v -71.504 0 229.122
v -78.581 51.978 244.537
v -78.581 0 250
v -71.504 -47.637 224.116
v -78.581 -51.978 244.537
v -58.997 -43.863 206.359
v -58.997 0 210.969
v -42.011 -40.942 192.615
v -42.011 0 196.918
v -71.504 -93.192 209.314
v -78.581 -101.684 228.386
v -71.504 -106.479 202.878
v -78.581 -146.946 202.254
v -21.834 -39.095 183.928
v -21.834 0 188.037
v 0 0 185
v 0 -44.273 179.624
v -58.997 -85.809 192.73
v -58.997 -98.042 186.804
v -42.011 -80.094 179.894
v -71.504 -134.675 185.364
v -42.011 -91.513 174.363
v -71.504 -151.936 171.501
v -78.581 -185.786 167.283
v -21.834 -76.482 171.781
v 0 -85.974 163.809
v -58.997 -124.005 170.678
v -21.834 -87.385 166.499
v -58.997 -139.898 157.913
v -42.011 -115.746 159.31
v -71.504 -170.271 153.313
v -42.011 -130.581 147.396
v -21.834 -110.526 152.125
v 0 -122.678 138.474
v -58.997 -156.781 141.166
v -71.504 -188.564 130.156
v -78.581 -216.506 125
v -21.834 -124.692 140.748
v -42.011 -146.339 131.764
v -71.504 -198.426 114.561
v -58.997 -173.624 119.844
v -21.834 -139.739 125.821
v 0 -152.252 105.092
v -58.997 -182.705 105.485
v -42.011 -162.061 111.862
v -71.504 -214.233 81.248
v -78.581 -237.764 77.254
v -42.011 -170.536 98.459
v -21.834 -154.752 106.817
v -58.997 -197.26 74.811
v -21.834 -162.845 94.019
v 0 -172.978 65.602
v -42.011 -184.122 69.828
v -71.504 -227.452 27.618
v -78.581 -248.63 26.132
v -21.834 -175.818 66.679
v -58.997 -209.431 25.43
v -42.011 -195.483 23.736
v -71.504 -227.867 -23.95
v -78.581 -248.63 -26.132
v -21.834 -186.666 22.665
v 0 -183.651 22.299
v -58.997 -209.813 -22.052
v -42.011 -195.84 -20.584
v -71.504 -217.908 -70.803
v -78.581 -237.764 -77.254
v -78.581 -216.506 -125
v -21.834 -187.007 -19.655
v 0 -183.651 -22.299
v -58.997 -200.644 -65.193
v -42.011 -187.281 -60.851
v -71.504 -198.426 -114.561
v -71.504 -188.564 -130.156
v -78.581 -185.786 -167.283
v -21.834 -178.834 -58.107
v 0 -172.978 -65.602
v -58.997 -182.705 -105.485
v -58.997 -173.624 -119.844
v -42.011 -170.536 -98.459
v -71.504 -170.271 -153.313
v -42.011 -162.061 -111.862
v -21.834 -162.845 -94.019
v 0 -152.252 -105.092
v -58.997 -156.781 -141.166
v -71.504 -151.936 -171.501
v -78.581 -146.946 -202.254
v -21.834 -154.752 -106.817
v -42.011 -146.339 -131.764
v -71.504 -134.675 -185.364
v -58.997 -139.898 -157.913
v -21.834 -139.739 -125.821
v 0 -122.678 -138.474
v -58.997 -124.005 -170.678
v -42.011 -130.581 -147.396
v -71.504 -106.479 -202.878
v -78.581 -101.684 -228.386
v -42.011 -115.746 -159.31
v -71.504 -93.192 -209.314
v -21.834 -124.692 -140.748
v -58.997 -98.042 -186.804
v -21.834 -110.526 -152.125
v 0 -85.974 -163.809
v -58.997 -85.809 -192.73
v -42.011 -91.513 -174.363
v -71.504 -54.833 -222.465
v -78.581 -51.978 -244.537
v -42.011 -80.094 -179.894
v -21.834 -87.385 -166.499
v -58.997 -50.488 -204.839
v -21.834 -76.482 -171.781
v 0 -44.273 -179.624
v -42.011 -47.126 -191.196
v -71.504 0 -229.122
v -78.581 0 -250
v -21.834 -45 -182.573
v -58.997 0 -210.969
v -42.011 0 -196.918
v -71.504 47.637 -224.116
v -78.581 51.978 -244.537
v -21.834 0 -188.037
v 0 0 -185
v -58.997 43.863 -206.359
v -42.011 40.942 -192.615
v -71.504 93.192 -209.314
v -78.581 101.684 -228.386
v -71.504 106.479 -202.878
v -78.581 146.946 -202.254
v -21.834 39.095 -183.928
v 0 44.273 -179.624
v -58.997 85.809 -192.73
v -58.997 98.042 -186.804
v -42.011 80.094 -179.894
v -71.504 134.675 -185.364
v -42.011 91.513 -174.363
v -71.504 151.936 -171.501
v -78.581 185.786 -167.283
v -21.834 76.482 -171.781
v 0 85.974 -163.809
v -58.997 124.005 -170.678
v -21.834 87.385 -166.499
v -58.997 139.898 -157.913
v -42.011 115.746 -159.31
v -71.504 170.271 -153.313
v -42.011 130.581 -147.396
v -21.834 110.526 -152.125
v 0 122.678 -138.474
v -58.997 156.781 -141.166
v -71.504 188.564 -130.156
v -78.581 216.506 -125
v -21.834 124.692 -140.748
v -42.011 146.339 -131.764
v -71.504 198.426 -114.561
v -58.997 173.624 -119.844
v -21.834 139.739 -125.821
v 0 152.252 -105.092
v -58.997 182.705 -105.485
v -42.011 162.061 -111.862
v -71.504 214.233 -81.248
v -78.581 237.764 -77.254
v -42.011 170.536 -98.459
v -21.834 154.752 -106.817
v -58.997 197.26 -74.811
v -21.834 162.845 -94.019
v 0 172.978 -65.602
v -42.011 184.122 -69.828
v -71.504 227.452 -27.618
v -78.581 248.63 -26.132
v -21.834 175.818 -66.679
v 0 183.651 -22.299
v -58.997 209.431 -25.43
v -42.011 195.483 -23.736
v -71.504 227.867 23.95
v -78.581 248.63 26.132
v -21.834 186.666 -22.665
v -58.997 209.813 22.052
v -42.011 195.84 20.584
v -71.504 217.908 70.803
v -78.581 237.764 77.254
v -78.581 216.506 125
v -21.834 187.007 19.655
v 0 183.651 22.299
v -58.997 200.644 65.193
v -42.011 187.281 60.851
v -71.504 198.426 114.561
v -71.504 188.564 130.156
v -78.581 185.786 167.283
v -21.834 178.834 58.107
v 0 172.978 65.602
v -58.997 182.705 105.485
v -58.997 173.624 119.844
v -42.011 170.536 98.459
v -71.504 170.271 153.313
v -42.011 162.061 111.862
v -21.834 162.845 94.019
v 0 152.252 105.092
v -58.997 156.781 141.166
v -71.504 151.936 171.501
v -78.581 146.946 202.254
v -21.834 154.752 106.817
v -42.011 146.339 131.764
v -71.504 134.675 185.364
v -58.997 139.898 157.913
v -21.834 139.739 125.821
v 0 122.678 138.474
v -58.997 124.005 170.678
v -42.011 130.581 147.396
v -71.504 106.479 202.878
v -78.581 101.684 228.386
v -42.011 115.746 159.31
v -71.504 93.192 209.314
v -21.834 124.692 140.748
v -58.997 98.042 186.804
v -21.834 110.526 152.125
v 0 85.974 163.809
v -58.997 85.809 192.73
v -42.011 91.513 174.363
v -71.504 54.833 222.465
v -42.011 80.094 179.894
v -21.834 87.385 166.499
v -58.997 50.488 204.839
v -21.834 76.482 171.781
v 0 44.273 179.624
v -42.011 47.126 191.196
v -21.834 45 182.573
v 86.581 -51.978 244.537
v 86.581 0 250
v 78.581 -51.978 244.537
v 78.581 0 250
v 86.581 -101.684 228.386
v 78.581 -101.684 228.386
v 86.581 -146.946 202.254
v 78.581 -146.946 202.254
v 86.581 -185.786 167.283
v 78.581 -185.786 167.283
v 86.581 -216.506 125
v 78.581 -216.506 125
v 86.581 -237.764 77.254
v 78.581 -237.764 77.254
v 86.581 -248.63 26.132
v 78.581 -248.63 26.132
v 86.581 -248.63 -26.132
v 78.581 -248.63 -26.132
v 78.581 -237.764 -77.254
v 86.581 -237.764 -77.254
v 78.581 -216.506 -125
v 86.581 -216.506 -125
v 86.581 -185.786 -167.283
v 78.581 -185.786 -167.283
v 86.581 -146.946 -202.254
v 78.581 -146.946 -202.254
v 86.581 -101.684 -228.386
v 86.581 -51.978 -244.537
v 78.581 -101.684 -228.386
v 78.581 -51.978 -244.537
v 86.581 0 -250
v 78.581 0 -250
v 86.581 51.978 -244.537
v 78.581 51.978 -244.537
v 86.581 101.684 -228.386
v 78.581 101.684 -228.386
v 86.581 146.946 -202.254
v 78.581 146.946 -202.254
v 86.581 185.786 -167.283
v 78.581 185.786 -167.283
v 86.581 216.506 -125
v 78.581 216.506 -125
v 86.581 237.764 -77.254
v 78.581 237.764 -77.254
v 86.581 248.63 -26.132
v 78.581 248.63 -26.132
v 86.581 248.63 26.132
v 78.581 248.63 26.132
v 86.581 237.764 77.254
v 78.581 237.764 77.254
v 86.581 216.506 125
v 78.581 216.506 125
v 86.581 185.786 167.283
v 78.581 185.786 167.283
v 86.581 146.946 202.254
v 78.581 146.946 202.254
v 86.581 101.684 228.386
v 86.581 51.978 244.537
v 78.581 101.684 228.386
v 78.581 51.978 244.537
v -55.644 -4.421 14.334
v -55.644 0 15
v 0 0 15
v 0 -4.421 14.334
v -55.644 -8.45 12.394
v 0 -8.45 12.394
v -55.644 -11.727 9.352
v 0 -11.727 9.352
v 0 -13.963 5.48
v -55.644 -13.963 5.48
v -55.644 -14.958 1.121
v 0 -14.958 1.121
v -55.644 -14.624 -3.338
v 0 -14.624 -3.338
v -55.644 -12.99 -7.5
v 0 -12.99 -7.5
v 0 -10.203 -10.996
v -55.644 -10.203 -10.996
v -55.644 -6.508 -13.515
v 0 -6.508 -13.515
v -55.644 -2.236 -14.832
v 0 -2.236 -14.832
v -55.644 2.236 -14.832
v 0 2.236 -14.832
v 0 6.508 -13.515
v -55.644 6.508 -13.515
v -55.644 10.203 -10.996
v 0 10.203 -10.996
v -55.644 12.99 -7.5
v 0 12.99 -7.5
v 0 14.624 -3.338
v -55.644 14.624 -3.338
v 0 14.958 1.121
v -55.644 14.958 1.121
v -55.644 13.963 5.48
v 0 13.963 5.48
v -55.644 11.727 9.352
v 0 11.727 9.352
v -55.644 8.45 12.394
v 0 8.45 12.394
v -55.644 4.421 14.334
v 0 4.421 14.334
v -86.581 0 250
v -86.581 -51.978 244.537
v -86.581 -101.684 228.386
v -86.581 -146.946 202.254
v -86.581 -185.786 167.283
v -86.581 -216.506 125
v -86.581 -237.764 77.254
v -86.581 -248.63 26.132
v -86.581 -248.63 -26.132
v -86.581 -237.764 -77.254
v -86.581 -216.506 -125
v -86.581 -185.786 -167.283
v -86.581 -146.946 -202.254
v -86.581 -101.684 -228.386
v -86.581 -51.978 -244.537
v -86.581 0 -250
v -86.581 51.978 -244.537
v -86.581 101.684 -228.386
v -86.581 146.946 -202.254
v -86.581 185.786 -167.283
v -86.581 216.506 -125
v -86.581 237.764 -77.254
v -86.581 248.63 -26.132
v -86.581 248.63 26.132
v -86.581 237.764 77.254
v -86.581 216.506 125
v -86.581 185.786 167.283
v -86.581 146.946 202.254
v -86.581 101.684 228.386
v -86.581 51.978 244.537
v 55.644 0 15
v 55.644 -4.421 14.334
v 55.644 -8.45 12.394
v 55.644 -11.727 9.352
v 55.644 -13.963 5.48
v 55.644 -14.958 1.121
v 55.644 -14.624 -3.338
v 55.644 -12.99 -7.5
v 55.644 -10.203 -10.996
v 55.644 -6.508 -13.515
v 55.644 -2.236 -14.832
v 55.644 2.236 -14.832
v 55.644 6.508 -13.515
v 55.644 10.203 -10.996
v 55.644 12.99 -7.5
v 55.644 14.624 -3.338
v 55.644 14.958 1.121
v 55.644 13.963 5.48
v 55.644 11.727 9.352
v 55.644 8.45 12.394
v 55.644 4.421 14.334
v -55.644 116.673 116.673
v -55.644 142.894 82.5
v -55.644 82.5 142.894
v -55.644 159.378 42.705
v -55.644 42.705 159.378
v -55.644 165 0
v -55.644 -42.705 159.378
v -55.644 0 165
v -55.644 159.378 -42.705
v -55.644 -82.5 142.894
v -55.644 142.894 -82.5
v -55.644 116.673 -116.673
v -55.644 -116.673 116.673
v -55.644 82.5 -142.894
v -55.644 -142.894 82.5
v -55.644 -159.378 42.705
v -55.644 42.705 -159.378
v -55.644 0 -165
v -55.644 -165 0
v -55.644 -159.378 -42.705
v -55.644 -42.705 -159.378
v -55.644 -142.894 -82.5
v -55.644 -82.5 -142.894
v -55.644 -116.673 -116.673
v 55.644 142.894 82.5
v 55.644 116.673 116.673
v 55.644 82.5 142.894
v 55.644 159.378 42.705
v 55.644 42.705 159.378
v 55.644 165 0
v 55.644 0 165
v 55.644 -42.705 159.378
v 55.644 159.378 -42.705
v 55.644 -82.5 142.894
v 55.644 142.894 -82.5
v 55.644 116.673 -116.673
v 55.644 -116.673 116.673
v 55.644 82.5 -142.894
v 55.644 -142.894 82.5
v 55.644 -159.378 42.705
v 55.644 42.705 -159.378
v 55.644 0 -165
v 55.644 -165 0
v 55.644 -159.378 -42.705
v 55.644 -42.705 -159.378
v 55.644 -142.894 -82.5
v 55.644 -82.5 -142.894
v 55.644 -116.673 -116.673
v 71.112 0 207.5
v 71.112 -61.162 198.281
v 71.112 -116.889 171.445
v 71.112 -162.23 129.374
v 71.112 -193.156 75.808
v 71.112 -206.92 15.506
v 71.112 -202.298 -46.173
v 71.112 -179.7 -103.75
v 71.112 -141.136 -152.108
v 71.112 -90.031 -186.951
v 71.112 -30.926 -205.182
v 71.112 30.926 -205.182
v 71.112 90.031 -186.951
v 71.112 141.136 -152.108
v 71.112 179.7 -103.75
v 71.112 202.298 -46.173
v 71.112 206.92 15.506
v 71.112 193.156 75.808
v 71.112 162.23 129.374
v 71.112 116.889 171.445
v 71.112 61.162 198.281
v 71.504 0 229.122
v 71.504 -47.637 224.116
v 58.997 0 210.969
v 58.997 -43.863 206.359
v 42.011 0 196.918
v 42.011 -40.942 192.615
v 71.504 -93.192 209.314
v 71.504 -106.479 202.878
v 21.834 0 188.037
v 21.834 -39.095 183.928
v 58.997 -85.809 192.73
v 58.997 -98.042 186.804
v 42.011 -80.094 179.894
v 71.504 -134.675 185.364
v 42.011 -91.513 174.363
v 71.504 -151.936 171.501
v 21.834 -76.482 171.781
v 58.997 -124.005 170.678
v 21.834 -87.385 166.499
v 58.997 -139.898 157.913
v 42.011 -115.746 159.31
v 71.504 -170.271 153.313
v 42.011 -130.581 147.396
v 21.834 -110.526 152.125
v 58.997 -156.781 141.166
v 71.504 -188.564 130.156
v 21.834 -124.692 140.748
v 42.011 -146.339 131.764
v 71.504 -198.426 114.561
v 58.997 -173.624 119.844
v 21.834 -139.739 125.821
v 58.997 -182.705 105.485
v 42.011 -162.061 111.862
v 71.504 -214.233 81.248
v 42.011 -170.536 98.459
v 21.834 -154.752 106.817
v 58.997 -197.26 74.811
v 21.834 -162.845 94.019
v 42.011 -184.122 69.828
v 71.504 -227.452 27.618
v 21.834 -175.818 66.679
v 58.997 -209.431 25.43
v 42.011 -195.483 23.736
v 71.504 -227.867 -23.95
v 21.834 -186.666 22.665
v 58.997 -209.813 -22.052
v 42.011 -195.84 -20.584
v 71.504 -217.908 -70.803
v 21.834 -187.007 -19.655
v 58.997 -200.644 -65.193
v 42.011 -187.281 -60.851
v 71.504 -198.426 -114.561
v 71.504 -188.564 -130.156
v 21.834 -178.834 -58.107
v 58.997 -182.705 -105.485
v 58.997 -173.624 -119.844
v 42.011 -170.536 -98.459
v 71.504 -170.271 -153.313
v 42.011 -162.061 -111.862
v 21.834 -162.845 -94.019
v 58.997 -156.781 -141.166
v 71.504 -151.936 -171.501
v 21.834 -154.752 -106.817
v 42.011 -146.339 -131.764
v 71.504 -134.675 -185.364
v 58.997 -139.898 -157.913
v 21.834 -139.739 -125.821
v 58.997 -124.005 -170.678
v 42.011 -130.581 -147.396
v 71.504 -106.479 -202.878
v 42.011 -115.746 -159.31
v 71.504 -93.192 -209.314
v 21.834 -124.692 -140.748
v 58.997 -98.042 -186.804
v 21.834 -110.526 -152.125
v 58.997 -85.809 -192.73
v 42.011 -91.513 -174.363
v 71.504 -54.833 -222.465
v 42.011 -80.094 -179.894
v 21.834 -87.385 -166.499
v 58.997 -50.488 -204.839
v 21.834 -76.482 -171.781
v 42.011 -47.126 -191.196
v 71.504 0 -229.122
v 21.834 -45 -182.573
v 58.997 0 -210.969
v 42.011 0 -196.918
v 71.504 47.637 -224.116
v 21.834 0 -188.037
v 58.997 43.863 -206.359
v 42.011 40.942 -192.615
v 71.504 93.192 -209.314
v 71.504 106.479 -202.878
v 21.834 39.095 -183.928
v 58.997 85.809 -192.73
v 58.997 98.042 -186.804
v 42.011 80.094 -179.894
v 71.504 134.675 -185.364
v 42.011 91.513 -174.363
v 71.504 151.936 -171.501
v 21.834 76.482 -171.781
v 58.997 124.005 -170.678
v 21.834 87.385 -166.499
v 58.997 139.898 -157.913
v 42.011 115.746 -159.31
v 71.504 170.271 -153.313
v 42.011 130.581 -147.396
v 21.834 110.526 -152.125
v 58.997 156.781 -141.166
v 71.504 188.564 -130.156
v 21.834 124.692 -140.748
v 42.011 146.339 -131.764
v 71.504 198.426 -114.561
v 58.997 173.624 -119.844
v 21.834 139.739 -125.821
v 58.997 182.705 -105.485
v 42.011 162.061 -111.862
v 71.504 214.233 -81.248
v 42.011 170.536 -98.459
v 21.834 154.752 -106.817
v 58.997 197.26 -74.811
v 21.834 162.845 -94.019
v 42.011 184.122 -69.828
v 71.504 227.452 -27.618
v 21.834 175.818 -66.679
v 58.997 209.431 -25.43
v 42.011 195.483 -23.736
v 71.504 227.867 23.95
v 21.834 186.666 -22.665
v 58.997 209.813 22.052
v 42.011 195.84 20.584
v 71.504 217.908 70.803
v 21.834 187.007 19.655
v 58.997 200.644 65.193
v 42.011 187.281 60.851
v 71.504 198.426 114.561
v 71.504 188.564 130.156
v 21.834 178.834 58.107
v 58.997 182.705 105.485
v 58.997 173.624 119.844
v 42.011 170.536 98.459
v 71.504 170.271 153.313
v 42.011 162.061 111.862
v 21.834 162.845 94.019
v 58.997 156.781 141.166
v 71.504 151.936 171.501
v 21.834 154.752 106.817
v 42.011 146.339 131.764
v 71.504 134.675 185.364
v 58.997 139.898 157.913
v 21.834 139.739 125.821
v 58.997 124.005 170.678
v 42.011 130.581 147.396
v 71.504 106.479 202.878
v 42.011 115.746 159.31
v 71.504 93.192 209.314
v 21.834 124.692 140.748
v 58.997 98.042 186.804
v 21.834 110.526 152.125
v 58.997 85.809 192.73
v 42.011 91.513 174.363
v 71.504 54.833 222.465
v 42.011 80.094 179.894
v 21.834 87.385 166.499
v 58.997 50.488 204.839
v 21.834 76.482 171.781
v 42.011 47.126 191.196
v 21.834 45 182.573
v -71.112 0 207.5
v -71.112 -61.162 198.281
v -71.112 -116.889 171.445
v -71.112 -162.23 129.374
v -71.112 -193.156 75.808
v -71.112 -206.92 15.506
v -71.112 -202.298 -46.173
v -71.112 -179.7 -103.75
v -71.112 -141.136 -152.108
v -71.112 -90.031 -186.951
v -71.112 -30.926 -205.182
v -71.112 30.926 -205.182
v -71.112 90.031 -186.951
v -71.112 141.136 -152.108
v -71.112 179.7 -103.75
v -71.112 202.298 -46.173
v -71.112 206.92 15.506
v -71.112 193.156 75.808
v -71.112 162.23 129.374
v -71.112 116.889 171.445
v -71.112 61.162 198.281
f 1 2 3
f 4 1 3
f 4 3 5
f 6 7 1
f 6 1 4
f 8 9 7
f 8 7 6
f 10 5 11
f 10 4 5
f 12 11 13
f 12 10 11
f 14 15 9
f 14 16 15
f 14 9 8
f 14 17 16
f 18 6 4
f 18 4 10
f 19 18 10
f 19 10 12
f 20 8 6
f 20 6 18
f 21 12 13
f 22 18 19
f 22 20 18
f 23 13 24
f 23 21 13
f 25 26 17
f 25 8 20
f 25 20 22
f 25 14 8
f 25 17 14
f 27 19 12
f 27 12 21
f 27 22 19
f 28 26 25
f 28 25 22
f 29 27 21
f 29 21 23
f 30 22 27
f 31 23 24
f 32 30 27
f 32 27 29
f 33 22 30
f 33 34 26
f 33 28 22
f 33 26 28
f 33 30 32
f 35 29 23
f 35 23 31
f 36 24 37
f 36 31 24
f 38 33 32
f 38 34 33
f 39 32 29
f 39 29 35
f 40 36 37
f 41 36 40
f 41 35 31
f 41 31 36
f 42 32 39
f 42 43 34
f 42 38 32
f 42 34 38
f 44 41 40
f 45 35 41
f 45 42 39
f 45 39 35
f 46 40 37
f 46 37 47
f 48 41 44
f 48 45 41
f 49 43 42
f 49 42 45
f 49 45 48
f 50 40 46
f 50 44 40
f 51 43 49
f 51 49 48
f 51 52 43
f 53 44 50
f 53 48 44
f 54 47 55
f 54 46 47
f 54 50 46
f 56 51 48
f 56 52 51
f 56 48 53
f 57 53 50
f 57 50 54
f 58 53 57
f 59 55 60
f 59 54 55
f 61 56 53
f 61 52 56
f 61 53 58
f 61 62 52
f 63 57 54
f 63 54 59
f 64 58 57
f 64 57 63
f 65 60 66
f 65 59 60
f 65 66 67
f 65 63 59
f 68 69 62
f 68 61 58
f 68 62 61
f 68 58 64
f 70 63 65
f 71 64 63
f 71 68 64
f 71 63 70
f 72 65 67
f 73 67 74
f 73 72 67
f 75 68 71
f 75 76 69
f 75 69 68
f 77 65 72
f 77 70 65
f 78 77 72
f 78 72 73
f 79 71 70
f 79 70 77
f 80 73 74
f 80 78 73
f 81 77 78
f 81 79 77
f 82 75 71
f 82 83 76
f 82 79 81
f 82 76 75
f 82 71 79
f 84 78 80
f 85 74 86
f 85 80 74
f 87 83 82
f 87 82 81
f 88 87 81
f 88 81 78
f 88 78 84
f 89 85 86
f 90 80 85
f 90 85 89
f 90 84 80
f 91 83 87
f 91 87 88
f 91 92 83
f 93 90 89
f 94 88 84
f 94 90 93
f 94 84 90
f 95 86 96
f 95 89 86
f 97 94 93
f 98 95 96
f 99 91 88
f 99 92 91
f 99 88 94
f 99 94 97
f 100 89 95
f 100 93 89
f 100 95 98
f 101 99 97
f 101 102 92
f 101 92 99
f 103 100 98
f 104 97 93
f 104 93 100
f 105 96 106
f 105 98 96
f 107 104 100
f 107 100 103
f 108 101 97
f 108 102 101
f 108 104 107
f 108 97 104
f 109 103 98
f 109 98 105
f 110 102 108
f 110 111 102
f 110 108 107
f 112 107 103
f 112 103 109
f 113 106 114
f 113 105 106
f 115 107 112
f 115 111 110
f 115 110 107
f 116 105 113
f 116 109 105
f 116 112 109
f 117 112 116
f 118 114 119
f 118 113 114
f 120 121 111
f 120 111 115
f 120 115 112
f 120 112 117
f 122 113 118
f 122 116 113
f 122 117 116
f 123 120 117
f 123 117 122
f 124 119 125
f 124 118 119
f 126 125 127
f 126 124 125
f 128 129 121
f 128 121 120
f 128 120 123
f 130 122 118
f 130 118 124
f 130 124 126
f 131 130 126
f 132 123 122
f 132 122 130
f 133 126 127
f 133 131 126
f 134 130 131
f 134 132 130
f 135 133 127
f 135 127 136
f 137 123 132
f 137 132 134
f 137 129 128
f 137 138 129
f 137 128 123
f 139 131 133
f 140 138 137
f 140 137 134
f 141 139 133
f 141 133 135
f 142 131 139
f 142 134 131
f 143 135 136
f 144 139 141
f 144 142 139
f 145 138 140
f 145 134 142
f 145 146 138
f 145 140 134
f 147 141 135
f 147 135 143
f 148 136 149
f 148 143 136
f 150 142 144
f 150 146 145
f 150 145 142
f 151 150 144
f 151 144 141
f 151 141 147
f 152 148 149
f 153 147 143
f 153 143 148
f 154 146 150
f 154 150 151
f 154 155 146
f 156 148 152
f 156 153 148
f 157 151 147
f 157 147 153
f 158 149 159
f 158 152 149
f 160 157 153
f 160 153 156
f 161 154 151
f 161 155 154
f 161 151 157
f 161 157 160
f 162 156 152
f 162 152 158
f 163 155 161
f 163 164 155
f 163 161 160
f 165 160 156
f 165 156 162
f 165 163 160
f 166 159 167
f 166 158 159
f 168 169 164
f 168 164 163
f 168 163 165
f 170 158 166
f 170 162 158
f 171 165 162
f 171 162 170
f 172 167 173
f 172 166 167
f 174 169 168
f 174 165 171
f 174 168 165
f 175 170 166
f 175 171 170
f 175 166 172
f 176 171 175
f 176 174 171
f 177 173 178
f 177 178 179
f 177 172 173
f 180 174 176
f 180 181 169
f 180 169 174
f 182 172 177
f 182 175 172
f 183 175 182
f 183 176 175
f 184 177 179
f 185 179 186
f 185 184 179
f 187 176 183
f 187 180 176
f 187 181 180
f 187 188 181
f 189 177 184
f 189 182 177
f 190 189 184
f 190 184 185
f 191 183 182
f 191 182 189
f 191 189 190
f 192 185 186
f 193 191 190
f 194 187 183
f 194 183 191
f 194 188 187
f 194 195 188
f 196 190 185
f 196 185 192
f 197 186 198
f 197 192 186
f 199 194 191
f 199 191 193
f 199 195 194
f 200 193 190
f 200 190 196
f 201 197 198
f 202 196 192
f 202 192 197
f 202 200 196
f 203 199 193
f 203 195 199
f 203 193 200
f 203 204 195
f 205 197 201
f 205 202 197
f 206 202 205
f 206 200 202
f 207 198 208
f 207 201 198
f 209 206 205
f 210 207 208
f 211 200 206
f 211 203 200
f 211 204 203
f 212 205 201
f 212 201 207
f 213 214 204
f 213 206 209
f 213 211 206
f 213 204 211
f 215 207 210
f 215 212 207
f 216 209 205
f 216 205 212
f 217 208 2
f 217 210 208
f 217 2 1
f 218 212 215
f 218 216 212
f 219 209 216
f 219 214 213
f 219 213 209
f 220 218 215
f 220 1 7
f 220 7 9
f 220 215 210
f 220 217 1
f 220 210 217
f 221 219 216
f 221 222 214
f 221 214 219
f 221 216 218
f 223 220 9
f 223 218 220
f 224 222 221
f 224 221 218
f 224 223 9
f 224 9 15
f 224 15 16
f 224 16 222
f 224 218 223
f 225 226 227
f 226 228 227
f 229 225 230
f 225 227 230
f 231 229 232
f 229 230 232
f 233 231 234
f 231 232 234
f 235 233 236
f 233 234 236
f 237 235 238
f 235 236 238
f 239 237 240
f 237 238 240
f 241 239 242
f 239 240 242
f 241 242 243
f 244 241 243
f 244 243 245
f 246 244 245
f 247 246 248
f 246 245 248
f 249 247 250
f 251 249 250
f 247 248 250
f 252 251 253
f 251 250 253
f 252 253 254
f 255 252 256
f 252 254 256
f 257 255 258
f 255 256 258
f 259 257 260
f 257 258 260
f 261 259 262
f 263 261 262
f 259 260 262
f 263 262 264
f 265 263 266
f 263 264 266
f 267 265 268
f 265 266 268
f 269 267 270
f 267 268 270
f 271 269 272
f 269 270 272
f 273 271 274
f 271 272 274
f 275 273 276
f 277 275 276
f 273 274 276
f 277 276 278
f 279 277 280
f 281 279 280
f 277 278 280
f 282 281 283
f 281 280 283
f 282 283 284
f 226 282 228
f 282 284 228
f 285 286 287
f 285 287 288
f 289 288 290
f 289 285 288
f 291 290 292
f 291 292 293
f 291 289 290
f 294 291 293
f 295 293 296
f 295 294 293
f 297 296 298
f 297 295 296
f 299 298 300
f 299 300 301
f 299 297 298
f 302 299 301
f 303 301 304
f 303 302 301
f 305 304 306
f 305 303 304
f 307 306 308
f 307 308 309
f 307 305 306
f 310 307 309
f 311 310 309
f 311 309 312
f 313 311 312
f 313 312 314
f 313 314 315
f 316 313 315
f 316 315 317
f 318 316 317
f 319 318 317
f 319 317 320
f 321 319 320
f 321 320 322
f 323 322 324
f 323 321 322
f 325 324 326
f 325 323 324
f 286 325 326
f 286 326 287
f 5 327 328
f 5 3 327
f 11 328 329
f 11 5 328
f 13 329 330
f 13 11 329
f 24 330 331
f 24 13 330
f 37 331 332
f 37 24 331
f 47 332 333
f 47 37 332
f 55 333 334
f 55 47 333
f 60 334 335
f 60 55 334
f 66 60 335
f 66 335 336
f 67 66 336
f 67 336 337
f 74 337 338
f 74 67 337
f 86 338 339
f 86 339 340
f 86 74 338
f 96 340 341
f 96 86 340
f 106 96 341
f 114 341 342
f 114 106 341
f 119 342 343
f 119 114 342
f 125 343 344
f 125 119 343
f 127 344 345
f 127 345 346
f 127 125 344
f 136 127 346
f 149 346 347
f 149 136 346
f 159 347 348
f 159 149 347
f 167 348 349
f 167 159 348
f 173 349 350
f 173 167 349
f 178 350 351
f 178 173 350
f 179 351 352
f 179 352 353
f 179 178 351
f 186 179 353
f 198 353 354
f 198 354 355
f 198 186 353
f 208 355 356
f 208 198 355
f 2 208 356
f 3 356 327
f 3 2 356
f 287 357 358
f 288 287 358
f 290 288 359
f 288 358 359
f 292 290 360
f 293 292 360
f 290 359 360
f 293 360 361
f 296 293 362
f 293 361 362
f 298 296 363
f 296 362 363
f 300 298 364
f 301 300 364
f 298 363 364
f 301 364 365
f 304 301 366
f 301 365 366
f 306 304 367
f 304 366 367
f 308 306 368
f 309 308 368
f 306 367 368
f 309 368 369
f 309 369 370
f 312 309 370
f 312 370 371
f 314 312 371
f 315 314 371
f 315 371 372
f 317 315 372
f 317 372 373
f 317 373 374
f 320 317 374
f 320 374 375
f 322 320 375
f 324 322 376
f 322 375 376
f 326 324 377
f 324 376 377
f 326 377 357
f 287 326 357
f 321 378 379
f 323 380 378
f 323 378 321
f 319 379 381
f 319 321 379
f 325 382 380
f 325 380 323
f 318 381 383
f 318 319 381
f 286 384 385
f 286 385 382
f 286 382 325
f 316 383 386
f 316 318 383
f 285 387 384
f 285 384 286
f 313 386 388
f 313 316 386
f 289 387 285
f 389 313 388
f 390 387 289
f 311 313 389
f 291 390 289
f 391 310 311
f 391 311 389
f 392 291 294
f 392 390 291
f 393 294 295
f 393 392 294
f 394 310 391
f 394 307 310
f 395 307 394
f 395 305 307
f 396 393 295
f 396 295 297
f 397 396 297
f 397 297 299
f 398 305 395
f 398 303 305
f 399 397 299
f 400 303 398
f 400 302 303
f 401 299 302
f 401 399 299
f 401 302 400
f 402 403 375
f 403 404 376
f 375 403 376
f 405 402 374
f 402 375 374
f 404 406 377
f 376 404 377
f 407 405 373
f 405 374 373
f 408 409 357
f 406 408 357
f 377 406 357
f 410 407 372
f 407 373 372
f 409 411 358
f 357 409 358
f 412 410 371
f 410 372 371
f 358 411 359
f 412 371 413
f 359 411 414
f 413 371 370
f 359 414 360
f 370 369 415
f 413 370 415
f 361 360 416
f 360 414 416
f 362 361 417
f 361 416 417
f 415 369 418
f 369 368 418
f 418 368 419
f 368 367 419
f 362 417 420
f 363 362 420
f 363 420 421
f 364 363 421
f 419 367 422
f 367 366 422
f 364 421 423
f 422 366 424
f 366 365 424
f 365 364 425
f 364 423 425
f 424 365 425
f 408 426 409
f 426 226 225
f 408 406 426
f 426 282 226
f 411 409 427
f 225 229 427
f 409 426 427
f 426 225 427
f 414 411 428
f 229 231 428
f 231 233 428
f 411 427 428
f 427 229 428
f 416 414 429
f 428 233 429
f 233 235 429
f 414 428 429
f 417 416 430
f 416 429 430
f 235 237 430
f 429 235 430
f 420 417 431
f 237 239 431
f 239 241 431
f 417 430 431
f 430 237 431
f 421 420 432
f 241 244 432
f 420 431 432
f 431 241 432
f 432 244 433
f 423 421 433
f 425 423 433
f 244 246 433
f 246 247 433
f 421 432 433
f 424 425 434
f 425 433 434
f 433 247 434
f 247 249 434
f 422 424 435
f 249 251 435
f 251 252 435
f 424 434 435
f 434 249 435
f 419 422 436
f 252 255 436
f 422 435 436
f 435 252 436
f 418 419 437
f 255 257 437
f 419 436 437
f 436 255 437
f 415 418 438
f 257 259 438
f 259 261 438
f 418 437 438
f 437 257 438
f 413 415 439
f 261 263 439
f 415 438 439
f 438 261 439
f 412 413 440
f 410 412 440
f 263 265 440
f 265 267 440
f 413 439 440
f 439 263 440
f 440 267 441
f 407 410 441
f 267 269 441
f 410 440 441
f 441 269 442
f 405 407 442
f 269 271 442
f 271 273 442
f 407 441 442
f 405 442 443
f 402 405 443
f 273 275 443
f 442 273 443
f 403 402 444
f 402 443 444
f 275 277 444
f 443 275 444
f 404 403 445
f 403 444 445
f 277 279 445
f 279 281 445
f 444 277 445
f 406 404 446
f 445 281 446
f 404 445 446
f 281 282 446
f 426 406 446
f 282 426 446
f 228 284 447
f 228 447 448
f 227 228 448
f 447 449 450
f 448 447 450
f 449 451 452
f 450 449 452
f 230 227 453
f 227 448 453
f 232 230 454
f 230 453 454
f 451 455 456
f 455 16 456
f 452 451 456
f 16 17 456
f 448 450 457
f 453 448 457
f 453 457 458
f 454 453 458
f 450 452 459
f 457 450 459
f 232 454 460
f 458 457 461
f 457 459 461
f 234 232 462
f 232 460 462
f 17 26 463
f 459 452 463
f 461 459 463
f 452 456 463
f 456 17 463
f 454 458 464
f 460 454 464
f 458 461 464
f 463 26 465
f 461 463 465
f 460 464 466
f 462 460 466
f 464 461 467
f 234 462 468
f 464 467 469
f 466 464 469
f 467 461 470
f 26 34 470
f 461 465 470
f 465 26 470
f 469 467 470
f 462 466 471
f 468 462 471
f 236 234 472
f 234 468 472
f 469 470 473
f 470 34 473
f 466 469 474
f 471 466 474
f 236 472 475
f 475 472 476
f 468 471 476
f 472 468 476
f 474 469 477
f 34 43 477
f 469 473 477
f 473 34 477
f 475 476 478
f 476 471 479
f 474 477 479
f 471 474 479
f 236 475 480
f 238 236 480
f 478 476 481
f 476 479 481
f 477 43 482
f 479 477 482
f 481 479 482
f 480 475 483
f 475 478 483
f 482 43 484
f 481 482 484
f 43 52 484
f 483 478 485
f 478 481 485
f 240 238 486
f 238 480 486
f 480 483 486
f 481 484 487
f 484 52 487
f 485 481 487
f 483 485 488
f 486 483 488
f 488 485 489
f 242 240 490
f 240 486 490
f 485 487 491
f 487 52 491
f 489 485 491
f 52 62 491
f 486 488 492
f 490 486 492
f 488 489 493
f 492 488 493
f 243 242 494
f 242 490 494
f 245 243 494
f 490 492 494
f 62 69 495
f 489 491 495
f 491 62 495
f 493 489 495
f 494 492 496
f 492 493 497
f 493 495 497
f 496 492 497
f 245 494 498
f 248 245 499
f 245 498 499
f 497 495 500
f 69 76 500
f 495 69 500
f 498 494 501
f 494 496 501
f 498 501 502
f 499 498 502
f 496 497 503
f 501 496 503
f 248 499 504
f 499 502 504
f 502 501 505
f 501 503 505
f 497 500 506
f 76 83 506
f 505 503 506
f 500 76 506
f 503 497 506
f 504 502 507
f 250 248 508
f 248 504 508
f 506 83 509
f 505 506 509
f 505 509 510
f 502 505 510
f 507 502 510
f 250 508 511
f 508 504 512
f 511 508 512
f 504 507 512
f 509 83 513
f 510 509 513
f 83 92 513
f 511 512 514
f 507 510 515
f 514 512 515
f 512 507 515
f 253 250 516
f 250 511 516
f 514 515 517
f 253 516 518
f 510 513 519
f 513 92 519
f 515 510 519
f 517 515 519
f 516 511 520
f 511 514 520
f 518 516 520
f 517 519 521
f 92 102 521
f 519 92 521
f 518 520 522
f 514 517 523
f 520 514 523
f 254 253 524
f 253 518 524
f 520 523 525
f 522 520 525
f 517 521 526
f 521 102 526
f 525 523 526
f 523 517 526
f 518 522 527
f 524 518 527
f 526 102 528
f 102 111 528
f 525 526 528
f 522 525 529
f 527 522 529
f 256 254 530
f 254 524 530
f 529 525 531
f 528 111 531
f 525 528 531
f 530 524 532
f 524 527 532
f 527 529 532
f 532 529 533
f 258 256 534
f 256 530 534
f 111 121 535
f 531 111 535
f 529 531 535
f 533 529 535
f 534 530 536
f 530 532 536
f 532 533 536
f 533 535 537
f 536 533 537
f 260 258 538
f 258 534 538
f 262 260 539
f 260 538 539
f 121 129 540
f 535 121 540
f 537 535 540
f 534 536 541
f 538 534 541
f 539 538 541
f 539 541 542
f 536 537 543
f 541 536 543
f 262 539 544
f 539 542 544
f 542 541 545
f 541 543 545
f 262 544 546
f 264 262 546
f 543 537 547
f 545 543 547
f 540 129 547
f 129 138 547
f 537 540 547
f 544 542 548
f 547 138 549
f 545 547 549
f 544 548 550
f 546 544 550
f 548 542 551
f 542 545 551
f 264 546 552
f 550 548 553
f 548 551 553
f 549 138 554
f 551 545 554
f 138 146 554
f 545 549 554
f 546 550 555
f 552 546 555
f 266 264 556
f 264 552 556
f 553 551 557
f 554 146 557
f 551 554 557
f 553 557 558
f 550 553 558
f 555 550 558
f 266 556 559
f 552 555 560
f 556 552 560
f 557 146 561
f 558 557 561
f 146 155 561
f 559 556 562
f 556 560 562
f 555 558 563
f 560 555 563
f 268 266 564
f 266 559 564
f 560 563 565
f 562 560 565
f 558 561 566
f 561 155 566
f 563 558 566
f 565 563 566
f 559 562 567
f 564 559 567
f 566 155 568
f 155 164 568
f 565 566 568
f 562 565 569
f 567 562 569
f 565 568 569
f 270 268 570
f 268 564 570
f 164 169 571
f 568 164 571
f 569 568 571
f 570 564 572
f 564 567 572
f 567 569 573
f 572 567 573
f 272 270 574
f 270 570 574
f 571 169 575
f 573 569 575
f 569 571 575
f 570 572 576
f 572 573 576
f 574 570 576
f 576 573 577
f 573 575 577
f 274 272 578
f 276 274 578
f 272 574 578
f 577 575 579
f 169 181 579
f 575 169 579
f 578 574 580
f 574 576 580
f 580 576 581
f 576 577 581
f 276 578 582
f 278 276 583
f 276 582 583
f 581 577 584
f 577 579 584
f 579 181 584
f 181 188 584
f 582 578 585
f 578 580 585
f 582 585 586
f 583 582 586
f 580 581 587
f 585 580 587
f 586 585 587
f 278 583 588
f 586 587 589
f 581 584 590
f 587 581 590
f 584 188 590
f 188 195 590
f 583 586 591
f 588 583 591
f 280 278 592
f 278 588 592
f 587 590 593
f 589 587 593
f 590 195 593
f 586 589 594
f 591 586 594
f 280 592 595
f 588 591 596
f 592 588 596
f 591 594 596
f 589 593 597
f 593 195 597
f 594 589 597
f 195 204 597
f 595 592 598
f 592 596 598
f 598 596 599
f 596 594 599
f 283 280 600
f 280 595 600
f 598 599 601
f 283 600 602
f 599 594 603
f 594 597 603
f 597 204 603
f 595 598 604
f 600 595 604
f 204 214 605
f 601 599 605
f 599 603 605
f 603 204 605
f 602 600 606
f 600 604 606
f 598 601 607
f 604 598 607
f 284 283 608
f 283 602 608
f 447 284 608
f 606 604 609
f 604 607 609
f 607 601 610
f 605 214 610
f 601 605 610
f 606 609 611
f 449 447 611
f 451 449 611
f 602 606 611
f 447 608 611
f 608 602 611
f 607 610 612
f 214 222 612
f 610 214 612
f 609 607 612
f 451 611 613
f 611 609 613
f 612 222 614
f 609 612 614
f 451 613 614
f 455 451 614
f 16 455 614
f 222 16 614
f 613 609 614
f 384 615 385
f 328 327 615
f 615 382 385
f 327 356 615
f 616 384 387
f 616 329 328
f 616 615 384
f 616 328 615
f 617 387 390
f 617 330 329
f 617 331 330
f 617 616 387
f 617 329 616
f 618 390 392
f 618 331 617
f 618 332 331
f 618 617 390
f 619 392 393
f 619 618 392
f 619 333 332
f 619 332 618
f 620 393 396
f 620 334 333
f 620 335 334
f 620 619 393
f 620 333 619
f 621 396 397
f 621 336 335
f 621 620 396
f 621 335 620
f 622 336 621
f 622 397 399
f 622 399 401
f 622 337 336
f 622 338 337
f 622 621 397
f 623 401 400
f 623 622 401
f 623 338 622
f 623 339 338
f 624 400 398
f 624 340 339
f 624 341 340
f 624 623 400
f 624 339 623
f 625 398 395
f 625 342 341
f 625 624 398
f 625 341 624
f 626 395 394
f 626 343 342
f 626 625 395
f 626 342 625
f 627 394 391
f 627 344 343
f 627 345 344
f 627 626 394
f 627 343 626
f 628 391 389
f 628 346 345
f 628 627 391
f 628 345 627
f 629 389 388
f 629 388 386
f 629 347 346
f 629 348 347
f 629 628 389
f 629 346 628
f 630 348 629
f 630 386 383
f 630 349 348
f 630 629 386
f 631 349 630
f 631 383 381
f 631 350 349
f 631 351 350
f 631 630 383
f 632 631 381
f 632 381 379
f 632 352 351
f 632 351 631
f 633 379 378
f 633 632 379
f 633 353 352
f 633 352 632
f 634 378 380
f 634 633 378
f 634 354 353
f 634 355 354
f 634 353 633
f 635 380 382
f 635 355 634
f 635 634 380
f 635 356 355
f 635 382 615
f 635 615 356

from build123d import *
from build123d import SkipClean  # not in build123d's __all__


with BuildPart() as f1:
    # F0 (on Front) → F1 (revolve)
    with BuildSketch(Plane.XZ):
        with BuildLine():
            Line((0, 15), (55.6436983149, 15))
            Line((55.6436983149, 15), (55.6436983149, 165))
            Line((55.6436983149, 165), (86.5811682275, 250))
            Line((86.5811682275, 250), (78.5811682275, 250))
            ThreePointArc((78.5811682275, 250), (50.9901951359, 203.3558599703), (0, 185))
            Line((0, 185), (0, 15))
        make_face()
    revolve(axis=Axis((-5.425222218, 0, 0), (1, 0, 0)))

    # F2: F1 across plane


with BuildPart() as f1_1:
    add(f1.part, clean=False)
    with SkipClean():  # cleaning this boolean's faces spoils the solid; the shape is the same uncleaned
        add(f1.part.mirror(Plane.YZ), clean=False)


solid = f1_1.part
